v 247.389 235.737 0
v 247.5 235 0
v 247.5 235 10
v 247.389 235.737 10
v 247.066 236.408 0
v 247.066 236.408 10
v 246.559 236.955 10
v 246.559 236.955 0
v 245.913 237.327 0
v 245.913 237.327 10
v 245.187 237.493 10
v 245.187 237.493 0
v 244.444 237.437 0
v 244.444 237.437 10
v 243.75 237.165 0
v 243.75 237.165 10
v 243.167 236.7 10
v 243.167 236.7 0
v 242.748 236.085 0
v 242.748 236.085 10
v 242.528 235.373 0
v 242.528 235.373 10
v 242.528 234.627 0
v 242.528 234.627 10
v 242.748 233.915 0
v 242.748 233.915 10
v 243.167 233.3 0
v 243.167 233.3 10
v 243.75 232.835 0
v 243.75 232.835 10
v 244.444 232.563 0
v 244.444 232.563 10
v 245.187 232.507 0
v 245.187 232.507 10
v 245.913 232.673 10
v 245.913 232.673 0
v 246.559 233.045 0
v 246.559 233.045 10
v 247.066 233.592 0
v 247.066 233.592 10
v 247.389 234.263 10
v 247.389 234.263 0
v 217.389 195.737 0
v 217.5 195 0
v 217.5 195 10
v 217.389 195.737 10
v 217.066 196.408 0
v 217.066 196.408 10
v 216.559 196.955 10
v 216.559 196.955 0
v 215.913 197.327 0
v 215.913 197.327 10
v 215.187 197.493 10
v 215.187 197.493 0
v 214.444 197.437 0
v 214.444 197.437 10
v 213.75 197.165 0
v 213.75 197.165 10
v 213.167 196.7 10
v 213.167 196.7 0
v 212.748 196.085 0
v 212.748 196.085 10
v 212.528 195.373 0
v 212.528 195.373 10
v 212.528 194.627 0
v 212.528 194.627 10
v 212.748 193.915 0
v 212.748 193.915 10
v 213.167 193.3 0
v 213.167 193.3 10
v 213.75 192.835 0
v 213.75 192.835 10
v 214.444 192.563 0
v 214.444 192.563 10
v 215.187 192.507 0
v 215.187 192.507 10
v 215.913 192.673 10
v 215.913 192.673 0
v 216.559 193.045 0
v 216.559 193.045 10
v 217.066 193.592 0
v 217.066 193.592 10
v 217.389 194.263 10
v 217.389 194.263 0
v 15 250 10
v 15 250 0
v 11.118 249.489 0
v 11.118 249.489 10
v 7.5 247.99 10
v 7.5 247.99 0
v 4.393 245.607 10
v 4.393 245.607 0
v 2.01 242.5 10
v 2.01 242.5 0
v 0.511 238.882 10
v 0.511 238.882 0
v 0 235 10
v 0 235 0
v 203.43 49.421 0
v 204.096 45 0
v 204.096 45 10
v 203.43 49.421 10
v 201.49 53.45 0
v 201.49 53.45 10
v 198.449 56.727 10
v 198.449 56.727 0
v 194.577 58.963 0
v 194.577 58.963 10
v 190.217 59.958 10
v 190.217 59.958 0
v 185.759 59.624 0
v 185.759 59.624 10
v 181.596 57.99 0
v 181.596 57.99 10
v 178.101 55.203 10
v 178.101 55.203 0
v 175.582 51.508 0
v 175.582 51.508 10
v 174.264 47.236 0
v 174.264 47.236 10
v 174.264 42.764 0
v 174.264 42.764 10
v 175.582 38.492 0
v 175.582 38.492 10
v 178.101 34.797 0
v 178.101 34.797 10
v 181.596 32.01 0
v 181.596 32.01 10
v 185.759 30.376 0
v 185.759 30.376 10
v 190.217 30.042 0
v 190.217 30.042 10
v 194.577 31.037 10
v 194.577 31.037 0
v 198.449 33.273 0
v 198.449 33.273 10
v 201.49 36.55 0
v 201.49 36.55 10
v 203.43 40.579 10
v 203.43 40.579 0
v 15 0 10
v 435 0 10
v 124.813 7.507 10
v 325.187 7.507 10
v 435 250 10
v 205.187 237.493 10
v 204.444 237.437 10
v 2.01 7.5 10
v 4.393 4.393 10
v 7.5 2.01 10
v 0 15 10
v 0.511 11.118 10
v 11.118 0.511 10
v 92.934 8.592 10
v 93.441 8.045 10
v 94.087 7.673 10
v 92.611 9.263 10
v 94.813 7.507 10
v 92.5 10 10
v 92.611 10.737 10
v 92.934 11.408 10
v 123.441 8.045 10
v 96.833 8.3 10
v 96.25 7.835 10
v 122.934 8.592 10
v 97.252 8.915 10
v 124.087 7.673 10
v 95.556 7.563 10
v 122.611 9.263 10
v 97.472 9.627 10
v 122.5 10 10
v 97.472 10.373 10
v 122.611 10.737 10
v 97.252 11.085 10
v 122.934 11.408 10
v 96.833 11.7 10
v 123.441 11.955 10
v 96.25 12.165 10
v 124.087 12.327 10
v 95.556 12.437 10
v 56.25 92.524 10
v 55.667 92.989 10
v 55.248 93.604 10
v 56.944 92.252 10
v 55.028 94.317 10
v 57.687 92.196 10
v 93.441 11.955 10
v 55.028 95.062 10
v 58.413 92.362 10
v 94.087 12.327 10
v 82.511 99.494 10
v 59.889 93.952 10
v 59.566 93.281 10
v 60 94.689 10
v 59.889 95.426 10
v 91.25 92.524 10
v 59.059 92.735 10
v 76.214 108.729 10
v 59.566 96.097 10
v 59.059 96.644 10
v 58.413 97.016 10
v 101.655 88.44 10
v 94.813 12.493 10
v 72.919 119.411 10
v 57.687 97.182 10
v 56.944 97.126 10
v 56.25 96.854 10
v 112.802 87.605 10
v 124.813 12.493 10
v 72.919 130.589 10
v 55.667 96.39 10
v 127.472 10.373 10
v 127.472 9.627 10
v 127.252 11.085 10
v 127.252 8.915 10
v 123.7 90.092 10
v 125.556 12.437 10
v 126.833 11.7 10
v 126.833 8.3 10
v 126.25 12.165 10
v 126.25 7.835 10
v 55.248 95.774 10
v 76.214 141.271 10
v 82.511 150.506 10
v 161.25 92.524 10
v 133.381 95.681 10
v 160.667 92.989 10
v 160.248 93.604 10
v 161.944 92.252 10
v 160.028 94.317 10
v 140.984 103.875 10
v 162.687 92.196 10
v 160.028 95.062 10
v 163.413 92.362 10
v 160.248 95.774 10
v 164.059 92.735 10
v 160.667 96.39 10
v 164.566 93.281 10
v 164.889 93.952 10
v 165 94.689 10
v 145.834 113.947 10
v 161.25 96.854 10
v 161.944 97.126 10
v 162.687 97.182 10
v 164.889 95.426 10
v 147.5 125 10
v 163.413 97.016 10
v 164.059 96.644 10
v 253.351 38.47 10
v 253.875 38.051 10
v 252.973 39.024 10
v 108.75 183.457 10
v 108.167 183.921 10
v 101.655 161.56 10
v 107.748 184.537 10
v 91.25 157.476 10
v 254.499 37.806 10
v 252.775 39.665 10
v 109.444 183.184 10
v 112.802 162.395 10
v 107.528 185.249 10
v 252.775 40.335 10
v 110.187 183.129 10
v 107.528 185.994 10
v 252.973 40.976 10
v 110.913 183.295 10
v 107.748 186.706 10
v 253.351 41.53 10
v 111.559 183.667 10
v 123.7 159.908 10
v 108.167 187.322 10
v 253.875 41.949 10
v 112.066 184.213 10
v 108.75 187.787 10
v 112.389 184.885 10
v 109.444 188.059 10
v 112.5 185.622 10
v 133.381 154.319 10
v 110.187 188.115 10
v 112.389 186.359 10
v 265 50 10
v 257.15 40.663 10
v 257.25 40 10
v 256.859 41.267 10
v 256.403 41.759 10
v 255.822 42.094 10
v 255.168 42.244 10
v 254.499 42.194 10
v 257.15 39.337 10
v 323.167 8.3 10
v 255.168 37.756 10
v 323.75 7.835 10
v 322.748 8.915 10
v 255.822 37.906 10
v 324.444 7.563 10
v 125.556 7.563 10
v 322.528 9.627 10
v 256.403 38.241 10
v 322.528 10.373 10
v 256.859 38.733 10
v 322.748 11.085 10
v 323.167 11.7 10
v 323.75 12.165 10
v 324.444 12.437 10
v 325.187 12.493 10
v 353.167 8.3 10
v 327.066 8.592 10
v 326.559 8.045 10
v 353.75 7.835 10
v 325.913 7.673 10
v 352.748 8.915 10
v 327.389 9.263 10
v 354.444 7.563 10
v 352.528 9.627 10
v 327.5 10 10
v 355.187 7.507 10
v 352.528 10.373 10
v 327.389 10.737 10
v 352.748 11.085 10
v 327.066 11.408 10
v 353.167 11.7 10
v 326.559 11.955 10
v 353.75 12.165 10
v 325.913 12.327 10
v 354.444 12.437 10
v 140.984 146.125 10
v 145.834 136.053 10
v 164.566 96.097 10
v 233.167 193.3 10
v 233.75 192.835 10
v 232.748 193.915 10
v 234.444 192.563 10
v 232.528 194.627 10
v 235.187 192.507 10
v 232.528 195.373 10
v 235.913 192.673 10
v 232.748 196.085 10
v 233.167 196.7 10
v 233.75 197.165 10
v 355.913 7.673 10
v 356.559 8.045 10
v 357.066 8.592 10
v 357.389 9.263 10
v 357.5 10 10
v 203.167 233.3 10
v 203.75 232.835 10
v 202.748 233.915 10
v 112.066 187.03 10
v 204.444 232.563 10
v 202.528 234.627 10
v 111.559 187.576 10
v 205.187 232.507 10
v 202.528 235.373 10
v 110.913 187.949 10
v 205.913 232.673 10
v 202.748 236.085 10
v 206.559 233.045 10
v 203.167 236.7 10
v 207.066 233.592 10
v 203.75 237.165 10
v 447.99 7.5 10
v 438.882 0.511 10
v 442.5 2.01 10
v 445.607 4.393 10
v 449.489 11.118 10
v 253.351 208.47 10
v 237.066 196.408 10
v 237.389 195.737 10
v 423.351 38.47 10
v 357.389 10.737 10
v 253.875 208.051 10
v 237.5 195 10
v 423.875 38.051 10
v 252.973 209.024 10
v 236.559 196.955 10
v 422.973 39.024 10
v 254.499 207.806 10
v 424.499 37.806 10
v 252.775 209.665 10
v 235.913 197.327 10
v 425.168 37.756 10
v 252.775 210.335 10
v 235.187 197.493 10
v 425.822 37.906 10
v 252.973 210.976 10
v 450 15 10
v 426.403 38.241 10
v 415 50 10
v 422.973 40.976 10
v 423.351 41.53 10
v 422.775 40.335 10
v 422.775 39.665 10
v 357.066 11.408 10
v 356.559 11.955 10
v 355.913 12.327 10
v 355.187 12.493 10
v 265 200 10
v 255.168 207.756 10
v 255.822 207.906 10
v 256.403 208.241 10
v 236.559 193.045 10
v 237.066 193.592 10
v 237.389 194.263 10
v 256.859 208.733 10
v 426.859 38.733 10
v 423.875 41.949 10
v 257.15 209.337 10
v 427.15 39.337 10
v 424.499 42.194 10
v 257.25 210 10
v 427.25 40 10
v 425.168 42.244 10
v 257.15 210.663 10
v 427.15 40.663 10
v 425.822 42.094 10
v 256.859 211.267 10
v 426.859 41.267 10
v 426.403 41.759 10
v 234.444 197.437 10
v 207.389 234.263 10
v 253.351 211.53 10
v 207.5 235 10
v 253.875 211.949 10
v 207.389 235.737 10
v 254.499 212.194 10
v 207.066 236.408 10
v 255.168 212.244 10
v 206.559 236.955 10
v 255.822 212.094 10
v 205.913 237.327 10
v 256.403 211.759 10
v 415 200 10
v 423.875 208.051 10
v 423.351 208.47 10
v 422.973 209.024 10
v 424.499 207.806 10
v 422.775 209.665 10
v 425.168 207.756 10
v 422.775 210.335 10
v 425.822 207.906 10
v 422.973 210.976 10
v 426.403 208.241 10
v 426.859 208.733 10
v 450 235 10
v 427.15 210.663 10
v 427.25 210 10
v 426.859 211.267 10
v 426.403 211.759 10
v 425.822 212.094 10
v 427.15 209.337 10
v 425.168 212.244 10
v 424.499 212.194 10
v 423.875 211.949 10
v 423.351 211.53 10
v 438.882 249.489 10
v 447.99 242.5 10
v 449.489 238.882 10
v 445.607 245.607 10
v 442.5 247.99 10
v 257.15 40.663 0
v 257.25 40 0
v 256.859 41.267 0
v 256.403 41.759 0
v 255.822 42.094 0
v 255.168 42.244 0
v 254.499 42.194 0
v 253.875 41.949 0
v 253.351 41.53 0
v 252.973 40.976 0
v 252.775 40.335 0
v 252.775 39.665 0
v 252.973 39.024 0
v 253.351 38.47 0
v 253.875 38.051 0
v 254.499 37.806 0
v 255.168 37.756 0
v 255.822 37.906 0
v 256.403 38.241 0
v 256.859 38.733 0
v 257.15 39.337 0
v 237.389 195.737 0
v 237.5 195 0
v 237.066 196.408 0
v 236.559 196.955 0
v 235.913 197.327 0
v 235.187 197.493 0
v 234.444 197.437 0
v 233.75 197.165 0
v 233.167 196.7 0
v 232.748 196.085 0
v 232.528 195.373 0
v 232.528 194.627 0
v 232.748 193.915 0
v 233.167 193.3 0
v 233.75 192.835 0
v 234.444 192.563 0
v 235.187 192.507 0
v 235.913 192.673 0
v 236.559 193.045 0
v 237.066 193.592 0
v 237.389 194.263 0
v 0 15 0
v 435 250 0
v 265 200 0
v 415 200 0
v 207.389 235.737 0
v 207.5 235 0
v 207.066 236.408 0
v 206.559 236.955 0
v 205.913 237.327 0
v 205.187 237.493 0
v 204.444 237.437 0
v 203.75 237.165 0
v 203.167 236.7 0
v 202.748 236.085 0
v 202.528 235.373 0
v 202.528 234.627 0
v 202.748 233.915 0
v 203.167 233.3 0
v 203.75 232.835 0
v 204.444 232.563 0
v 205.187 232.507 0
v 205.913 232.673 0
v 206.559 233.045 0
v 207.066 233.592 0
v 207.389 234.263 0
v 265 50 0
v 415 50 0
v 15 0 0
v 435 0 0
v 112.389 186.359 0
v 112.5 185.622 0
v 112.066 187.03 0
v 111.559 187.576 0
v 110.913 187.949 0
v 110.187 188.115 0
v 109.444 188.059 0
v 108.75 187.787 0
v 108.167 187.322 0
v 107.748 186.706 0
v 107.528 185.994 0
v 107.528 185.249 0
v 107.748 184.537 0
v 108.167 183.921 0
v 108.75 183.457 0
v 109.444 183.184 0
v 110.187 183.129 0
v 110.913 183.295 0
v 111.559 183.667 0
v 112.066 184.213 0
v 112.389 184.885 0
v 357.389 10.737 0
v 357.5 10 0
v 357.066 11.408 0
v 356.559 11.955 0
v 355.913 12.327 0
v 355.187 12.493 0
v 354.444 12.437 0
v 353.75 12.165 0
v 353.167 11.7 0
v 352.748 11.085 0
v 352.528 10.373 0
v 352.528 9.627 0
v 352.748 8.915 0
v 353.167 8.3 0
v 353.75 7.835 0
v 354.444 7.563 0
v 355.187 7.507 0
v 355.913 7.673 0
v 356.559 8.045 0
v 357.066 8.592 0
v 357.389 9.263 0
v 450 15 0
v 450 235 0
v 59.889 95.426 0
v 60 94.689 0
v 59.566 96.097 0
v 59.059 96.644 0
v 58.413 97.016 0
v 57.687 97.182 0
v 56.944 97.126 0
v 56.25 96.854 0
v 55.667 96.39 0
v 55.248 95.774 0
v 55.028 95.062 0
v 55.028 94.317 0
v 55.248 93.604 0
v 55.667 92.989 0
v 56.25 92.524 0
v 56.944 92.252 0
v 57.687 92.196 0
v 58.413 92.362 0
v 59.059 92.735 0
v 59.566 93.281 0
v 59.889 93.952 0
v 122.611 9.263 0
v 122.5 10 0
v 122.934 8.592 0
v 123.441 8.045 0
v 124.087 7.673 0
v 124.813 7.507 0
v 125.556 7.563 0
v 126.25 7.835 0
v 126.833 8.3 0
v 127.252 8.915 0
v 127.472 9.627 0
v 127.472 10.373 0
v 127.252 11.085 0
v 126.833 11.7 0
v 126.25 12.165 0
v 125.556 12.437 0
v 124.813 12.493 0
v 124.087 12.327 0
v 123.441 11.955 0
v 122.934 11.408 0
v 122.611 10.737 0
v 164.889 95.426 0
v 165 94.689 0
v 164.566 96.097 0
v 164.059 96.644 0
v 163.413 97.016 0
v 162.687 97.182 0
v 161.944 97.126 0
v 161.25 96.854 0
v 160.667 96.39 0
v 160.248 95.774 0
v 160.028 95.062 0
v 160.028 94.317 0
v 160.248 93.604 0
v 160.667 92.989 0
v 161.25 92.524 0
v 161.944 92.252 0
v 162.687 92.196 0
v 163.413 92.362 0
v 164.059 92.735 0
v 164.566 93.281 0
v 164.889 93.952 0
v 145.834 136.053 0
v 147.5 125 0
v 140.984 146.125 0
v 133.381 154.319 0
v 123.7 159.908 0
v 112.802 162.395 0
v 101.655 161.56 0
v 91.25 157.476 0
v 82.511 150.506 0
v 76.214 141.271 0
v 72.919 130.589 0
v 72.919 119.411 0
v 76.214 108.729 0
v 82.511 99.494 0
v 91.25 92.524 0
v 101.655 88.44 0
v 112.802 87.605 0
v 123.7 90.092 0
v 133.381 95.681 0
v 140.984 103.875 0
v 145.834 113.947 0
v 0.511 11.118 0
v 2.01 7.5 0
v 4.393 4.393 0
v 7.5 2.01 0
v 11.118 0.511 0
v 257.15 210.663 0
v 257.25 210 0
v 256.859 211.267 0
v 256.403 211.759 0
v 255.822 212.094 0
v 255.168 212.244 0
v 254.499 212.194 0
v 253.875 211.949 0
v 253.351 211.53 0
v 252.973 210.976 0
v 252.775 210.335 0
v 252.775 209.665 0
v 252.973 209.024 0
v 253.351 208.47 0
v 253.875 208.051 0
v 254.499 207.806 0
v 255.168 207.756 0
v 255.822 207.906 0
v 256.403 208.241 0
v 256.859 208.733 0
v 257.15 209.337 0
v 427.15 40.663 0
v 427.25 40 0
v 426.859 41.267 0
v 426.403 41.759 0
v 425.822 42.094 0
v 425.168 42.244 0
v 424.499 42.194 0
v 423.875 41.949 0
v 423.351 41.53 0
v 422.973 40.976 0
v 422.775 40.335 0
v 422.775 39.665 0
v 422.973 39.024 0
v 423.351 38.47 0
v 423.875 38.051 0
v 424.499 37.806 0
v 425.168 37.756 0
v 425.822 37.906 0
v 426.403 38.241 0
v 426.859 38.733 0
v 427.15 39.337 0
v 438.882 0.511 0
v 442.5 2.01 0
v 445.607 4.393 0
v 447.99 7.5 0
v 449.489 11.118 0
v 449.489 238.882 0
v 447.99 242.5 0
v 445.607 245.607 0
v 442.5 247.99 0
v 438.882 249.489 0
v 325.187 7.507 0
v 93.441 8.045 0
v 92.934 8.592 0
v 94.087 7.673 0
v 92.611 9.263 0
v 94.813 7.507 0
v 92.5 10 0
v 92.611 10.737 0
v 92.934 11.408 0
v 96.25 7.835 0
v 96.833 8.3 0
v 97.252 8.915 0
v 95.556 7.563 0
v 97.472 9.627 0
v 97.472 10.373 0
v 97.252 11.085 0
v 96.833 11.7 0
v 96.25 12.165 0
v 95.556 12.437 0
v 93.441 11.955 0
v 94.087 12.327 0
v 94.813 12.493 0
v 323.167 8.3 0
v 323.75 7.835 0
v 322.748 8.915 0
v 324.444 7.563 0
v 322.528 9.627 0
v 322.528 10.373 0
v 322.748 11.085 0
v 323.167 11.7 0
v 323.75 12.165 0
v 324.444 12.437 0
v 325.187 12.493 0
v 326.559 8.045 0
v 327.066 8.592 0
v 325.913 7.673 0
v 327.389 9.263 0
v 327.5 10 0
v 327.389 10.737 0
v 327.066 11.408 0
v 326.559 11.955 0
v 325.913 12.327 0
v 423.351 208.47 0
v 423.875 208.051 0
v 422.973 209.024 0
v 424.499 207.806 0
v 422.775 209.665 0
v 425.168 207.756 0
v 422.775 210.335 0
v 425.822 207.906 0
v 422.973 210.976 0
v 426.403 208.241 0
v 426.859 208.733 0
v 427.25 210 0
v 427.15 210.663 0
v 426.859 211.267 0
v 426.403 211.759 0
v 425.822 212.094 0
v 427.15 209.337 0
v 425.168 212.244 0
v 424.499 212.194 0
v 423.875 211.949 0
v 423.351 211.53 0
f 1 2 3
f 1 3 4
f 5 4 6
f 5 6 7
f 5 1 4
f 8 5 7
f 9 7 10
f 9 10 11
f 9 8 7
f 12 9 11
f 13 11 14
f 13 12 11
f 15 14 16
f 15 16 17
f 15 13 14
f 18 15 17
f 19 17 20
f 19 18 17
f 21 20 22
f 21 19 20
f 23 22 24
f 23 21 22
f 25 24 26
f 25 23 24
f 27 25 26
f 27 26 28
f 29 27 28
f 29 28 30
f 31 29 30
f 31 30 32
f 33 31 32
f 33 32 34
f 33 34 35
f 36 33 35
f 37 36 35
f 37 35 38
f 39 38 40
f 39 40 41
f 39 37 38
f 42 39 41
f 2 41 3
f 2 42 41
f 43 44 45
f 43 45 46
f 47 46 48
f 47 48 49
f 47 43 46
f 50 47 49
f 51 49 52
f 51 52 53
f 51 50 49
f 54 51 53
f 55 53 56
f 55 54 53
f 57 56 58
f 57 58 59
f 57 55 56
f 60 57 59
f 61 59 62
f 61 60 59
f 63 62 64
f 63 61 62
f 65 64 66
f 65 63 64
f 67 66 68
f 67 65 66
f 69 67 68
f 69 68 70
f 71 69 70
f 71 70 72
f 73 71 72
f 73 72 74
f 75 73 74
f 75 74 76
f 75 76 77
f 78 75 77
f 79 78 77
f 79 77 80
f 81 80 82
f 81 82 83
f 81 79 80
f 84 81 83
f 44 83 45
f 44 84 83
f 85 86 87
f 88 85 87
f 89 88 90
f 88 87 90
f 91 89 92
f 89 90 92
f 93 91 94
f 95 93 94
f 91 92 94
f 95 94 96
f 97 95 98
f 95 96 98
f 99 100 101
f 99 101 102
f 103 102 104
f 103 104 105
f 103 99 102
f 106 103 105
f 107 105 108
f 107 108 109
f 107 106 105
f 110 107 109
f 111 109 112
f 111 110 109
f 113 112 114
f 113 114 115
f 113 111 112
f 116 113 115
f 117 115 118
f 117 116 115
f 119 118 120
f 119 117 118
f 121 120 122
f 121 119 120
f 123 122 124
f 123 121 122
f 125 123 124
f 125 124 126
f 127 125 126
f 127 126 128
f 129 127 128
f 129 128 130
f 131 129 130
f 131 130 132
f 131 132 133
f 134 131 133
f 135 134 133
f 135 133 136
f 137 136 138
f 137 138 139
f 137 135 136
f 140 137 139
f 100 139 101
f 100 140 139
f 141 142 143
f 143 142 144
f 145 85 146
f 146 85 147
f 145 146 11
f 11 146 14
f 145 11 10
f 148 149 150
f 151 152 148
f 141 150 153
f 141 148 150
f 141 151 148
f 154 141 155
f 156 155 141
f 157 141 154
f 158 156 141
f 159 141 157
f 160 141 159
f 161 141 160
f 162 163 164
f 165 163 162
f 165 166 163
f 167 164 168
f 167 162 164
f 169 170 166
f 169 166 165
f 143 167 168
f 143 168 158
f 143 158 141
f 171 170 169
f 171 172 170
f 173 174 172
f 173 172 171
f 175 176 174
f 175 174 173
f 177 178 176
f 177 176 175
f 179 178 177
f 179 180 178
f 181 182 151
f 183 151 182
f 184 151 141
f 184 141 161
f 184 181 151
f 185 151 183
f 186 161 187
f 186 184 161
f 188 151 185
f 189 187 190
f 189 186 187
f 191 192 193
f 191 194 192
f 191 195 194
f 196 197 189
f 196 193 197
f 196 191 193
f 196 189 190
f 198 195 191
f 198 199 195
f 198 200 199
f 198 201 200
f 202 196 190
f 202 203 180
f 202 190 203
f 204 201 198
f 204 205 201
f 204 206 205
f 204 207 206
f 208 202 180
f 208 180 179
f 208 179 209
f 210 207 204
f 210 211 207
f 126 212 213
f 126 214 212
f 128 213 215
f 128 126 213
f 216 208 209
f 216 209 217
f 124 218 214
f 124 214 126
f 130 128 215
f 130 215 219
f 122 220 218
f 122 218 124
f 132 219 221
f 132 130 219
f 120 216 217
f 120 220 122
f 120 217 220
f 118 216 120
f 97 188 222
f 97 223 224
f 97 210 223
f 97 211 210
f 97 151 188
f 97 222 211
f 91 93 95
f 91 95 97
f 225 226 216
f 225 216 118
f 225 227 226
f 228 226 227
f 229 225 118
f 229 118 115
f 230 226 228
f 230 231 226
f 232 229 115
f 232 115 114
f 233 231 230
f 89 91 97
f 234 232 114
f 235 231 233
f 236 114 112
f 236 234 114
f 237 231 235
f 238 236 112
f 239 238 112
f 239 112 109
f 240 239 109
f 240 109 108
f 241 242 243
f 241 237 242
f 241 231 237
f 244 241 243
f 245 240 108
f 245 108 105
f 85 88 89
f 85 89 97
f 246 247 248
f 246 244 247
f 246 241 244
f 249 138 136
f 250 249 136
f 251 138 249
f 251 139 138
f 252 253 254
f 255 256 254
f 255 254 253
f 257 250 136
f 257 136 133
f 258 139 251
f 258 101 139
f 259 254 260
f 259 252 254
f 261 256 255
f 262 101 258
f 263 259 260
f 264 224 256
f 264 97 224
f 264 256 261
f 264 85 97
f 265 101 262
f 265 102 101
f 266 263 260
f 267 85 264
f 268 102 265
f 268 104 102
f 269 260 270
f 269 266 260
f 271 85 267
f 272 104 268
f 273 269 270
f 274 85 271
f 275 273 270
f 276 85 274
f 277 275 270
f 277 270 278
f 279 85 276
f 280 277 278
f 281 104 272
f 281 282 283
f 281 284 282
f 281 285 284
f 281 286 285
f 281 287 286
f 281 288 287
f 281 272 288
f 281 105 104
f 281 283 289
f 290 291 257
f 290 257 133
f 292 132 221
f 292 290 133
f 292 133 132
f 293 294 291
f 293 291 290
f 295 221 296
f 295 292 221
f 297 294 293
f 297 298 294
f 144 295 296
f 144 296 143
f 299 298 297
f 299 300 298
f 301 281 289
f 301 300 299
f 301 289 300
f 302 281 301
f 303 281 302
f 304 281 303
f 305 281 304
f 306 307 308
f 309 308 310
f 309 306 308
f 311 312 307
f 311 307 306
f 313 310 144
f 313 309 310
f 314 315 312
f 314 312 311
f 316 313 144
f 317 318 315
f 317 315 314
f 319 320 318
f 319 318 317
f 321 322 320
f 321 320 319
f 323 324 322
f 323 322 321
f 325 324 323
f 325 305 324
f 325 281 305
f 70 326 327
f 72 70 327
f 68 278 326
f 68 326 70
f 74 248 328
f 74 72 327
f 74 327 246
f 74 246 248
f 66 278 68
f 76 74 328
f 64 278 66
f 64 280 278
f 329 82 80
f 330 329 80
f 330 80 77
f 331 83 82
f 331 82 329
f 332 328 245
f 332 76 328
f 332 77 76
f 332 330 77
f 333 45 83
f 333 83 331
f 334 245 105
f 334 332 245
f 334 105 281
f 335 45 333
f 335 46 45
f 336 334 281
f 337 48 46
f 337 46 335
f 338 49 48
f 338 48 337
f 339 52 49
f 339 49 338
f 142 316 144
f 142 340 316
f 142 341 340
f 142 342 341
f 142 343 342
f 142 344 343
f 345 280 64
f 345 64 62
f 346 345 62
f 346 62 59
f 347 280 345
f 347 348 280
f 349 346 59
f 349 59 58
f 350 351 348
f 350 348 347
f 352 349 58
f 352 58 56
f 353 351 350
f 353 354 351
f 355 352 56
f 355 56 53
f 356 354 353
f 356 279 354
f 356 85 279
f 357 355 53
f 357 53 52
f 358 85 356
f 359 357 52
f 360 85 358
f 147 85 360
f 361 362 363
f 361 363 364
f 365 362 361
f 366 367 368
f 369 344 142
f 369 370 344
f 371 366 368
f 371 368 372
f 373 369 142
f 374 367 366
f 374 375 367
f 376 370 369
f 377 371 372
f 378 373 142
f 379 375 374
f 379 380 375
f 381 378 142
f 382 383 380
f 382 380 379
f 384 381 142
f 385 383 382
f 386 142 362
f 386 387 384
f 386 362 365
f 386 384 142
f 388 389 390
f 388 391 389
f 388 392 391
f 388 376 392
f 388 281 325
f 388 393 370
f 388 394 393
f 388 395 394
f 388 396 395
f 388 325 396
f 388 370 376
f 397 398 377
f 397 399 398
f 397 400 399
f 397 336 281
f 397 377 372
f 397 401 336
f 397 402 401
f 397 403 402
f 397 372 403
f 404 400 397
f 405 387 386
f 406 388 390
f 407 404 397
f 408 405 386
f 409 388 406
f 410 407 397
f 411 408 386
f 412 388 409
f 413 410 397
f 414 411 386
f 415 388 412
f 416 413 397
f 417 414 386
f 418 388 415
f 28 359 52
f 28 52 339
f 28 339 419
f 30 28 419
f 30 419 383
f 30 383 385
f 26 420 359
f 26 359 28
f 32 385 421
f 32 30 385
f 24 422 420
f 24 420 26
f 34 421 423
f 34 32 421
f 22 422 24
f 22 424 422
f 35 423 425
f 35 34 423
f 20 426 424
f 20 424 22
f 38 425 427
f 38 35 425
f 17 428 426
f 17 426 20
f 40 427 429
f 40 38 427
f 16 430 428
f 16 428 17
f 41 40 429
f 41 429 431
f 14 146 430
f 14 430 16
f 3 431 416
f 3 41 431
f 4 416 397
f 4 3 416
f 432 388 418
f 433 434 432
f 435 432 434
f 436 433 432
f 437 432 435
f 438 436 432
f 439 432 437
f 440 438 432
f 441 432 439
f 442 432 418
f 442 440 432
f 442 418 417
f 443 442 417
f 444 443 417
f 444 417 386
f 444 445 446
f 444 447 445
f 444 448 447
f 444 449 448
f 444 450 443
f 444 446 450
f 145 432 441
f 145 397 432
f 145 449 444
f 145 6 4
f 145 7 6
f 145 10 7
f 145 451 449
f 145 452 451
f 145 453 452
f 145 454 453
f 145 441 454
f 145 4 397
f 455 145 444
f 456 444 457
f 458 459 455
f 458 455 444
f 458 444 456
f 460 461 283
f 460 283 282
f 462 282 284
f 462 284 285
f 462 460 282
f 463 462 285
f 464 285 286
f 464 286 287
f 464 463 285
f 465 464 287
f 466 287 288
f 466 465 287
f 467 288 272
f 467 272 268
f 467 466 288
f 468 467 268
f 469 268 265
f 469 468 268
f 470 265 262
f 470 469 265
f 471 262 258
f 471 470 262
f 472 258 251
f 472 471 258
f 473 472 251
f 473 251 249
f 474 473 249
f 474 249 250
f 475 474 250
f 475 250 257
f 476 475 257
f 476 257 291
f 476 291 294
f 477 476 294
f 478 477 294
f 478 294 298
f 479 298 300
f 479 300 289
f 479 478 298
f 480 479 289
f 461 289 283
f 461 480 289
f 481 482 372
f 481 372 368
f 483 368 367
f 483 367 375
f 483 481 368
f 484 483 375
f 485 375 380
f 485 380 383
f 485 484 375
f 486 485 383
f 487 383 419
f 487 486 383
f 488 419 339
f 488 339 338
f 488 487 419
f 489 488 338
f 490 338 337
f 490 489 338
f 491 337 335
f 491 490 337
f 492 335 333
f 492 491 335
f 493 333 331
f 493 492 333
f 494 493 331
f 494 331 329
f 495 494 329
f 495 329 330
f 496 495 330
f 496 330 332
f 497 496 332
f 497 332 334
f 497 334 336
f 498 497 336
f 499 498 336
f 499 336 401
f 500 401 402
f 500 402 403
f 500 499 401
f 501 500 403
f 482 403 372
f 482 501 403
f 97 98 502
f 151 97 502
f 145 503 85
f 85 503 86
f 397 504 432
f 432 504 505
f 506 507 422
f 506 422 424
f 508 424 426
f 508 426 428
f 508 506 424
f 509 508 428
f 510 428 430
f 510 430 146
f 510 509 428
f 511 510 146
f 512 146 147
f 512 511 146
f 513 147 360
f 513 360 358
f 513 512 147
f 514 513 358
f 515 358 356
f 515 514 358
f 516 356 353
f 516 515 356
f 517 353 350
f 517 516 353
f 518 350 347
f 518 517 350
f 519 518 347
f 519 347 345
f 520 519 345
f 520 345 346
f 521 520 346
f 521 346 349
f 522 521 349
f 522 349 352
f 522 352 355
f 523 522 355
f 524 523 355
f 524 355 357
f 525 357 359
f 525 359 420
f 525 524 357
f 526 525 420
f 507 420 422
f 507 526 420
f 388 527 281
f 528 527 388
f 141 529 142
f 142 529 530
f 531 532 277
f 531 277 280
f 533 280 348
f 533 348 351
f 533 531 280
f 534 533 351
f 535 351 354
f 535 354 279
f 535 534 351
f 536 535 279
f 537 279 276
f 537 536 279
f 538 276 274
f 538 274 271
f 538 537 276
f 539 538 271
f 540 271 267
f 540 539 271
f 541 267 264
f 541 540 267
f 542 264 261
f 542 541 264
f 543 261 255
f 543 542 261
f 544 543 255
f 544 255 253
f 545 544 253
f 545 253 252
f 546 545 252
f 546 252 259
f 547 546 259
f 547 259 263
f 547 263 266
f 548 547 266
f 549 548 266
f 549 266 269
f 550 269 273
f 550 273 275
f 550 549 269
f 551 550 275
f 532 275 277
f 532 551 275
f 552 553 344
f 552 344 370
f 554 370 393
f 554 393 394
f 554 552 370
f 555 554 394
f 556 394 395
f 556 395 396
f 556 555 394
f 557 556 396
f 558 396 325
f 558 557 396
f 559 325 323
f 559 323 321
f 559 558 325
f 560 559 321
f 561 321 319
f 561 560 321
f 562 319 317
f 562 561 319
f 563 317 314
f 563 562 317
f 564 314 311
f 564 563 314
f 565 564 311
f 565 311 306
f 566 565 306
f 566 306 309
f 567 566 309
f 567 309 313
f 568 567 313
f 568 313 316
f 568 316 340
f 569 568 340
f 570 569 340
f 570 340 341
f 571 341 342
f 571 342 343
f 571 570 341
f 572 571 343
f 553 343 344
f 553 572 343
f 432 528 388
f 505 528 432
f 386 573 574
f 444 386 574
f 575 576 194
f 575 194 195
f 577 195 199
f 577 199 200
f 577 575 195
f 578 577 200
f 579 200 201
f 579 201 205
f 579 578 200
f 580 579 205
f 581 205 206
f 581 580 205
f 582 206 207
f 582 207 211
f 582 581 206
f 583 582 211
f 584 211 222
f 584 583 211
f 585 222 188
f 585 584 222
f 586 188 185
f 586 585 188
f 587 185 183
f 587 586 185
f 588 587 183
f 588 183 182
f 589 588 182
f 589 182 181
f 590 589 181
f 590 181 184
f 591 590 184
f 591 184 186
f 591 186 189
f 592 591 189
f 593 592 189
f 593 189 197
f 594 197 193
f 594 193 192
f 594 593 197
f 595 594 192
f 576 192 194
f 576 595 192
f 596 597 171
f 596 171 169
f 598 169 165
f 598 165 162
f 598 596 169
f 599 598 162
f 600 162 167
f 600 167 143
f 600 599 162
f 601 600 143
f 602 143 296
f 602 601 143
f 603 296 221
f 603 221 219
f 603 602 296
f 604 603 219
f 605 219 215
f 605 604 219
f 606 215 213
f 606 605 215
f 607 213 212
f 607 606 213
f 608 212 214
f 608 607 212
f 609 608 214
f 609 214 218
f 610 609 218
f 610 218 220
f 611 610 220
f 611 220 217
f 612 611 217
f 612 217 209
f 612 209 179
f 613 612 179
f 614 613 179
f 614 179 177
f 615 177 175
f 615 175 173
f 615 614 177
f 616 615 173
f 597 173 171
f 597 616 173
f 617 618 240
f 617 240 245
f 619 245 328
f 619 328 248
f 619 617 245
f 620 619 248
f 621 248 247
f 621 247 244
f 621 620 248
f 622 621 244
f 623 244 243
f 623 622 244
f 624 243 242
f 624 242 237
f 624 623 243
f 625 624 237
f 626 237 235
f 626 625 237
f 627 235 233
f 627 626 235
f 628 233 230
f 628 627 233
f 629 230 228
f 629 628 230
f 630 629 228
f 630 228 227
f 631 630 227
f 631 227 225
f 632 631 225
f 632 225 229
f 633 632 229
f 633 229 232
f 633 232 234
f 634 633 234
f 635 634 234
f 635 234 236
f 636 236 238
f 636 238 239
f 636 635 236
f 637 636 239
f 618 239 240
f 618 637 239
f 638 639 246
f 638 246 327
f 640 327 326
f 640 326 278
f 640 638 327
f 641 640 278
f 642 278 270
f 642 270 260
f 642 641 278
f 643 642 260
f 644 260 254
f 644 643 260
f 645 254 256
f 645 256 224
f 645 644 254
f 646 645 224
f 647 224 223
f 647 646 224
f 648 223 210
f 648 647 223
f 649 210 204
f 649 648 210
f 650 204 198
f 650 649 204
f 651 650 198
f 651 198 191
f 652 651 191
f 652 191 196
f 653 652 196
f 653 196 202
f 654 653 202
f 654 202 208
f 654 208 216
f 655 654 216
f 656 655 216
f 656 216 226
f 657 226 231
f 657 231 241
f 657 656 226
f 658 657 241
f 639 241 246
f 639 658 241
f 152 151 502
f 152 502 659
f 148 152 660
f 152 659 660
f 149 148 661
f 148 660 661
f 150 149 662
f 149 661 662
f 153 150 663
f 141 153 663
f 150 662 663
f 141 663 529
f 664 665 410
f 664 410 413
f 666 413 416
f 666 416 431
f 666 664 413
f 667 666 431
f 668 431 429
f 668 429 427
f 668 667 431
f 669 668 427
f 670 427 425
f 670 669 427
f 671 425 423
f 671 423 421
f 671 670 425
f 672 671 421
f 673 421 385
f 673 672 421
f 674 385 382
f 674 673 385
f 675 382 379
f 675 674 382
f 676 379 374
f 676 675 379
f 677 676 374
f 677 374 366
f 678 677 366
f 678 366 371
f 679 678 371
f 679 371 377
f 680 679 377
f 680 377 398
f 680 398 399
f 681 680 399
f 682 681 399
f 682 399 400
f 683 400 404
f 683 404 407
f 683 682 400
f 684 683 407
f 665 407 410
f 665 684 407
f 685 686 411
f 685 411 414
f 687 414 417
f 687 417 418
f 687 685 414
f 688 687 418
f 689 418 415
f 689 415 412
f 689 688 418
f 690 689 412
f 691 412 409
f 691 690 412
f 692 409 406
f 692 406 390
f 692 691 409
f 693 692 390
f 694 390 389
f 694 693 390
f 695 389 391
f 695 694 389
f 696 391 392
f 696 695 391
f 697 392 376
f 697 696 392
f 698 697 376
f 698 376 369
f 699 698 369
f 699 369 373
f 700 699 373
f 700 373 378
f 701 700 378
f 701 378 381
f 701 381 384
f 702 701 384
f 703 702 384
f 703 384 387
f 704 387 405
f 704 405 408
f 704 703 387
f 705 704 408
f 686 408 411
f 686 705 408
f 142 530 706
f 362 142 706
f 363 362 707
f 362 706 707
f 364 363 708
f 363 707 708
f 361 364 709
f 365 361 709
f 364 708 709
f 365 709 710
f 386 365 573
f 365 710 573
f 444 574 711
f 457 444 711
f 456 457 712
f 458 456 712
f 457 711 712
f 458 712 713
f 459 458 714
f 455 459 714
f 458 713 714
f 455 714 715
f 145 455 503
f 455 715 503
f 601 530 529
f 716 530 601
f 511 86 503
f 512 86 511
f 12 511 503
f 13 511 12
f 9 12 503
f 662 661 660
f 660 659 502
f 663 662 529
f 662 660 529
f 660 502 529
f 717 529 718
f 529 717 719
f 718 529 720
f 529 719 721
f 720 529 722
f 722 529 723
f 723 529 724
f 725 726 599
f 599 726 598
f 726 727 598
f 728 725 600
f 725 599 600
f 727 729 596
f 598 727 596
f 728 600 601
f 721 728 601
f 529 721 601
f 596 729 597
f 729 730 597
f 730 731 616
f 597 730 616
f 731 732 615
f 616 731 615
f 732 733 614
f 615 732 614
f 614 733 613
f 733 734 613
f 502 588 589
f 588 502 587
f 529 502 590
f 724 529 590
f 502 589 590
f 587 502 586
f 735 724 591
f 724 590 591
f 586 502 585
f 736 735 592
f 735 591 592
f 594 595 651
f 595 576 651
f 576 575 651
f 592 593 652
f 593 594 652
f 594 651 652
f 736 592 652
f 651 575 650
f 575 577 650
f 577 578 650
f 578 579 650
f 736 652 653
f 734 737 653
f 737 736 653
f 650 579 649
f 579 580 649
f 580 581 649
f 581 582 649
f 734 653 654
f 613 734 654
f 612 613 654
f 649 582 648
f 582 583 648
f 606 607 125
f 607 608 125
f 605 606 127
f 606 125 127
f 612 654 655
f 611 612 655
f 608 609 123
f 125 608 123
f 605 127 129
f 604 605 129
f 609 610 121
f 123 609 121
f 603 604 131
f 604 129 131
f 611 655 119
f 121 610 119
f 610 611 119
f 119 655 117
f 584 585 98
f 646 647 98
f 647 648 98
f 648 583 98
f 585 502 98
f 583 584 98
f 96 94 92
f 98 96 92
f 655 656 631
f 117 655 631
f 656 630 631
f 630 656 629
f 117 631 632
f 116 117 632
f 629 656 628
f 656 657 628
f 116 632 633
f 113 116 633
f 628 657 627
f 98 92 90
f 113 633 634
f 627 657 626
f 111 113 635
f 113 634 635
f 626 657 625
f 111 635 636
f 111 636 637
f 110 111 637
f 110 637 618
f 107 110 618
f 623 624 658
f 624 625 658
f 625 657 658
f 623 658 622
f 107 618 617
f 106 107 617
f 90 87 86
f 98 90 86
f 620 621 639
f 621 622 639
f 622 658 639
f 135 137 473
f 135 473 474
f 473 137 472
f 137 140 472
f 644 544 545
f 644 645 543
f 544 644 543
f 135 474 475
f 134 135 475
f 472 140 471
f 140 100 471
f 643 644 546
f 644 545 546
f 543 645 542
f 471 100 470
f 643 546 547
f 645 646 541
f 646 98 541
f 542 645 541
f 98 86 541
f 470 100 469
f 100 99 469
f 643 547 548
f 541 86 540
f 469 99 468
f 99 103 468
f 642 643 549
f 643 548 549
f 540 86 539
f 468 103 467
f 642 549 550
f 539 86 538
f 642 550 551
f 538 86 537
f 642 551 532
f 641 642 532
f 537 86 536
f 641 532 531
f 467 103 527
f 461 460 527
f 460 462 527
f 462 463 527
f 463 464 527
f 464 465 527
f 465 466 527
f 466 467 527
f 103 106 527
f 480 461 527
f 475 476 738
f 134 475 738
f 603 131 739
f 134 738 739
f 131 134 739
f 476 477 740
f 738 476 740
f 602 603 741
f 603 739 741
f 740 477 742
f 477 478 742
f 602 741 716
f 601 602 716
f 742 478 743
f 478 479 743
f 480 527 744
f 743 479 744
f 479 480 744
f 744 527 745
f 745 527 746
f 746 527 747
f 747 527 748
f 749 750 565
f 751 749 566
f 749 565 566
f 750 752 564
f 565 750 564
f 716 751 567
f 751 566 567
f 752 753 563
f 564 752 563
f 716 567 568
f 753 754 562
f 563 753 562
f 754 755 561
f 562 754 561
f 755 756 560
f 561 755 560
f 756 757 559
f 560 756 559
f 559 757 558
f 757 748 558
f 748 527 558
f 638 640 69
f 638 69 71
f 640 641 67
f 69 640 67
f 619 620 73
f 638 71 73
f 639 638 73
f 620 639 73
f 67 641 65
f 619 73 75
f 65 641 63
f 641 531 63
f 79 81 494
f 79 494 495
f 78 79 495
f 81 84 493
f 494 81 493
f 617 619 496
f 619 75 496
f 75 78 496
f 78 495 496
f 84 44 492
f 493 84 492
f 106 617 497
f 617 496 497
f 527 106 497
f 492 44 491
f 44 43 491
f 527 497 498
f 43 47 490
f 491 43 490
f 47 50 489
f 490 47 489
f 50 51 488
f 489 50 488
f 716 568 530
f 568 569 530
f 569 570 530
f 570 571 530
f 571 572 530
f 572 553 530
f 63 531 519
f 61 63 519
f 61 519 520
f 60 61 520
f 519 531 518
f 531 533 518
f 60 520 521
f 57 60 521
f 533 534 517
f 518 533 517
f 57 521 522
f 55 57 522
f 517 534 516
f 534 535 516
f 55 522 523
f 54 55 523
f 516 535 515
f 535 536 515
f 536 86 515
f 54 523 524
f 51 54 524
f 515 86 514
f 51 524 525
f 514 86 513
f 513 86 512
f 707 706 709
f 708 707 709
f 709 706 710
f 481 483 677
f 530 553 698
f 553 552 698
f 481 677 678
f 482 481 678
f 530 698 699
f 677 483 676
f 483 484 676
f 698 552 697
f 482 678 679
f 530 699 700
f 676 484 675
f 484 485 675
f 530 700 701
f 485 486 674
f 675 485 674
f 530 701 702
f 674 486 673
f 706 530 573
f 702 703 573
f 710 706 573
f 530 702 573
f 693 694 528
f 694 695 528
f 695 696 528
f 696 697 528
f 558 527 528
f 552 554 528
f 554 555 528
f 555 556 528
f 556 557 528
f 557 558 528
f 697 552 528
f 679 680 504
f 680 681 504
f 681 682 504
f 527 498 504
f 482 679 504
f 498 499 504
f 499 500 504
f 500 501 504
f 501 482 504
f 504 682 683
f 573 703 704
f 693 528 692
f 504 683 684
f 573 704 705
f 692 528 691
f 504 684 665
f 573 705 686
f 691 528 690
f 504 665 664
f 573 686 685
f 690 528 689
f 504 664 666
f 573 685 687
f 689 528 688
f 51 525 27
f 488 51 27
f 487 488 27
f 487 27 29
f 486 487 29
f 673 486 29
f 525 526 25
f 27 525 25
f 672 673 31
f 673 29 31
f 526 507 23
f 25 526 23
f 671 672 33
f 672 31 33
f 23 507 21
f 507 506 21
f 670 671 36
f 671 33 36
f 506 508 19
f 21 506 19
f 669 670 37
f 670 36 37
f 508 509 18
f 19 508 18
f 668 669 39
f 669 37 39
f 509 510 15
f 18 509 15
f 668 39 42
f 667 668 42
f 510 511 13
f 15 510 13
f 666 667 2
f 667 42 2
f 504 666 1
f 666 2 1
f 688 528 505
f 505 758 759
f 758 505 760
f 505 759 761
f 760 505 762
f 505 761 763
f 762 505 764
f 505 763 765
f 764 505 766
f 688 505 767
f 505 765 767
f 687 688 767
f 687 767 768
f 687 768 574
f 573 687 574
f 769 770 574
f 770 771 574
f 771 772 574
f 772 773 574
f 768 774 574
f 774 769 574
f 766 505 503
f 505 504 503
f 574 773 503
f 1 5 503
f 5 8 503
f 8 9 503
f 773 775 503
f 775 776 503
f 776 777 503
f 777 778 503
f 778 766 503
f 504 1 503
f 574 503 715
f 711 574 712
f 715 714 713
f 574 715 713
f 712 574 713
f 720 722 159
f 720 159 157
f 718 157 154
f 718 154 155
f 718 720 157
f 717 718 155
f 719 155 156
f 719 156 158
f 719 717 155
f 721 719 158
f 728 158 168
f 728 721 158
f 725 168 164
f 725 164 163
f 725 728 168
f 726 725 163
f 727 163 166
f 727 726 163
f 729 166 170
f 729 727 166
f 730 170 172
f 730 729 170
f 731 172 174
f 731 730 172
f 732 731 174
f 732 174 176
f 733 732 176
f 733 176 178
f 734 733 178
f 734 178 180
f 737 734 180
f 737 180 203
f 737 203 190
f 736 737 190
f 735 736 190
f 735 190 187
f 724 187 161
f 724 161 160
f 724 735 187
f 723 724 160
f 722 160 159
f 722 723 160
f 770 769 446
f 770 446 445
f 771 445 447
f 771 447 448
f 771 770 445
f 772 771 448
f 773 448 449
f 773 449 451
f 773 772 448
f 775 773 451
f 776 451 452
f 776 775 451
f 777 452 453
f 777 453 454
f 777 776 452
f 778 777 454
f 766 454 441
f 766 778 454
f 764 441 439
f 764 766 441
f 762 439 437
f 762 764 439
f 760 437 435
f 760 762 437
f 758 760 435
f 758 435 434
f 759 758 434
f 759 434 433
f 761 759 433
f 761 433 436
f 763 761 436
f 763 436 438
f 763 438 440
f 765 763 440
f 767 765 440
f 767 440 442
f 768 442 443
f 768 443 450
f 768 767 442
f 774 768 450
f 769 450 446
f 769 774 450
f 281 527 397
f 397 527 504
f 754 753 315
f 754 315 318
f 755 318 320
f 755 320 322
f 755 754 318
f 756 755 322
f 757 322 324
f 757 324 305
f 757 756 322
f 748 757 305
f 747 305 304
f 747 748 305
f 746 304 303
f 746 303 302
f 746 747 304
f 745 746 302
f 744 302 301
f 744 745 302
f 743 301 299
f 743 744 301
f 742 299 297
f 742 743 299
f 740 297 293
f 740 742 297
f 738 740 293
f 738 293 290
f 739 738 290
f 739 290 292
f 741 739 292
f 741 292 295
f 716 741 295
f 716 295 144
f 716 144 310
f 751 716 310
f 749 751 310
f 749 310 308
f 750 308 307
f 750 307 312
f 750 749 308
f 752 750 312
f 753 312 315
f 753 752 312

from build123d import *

# Parameters (mm, degrees)
CROQUIS1_R              = 2.5
CROQUIS1_R_2            = 37.5
CROQUIS1_R_3            = 15
CROQUIS1_R_4            = 2.25
CROQUIS1_W              = 150
CROQUIS1_H              = 150
SALIENTE_EXTRUIR1_DEPTH = 10


with BuildPart() as part:
    # Croquis1 → Saliente-Extruir1 (new body)
    with BuildSketch(Plane.XY):
        with BuildLine():
            Line((15, 0), (435, 0))
            ThreePointArc((435, 0), (445.606601718, 4.393398282), (450, 15))
            Line((450, 15), (450, 235))
            ThreePointArc((450, 235), (445.606601718, 245.606601718), (435, 250))
            Line((435, 250), (15, 250))
            ThreePointArc((15, 250), (4.393398282, 245.606601718), (0, 235))
            Line((0, 235), (0, 15))
            ThreePointArc((0, 15), (4.393398282, 4.393398282), (15, 0))
        make_face()
        with Locations((110, 185.621778265)):
            Circle(CROQUIS1_R, mode=Mode.SUBTRACT)
        with Locations((162.5, 94.689110868)):
            Circle(CROQUIS1_R, mode=Mode.SUBTRACT)
        with Locations((57.5, 94.689110868)):
            Circle(CROQUIS1_R, mode=Mode.SUBTRACT)
        with Locations((110, 125)):
            Circle(CROQUIS1_R_2, mode=Mode.SUBTRACT)
        with Locations((205, 235)):
            Circle(CROQUIS1_R, mode=Mode.SUBTRACT)
        with Locations((245, 235)):
            Circle(CROQUIS1_R, mode=Mode.SUBTRACT)
        with Locations((189.096460098, 45)):
            Circle(CROQUIS1_R_3, mode=Mode.SUBTRACT)
        with Locations((425, 210)):
            Circle(CROQUIS1_R_4, mode=Mode.SUBTRACT)
        with Locations((255, 210)):
            Circle(CROQUIS1_R_4, mode=Mode.SUBTRACT)
        with Locations((255, 40)):
            Circle(CROQUIS1_R_4, mode=Mode.SUBTRACT)
        with Locations((425, 40)):
            Circle(CROQUIS1_R_4, mode=Mode.SUBTRACT)
        with Locations((325, 10)):
            Circle(CROQUIS1_R, mode=Mode.SUBTRACT)
        with Locations((355, 10)):
            Circle(CROQUIS1_R, mode=Mode.SUBTRACT)
        with Locations(Location((95, 10, 0), (0, 0, 180))):
            Circle(CROQUIS1_R, mode=Mode.SUBTRACT)
        with Locations(Location((125, 10, 0), (0, 0, 180))):
            Circle(CROQUIS1_R, mode=Mode.SUBTRACT)
        with Locations((215, 195)):
            Circle(CROQUIS1_R, mode=Mode.SUBTRACT)
        with Locations((235, 195)):
            Circle(CROQUIS1_R, mode=Mode.SUBTRACT)
        with Locations((340, 125)):
            Rectangle(CROQUIS1_W, CROQUIS1_H, mode=Mode.SUBTRACT)
    extrude(amount=SALIENTE_EXTRUIR1_DEPTH)


solid = part.part
